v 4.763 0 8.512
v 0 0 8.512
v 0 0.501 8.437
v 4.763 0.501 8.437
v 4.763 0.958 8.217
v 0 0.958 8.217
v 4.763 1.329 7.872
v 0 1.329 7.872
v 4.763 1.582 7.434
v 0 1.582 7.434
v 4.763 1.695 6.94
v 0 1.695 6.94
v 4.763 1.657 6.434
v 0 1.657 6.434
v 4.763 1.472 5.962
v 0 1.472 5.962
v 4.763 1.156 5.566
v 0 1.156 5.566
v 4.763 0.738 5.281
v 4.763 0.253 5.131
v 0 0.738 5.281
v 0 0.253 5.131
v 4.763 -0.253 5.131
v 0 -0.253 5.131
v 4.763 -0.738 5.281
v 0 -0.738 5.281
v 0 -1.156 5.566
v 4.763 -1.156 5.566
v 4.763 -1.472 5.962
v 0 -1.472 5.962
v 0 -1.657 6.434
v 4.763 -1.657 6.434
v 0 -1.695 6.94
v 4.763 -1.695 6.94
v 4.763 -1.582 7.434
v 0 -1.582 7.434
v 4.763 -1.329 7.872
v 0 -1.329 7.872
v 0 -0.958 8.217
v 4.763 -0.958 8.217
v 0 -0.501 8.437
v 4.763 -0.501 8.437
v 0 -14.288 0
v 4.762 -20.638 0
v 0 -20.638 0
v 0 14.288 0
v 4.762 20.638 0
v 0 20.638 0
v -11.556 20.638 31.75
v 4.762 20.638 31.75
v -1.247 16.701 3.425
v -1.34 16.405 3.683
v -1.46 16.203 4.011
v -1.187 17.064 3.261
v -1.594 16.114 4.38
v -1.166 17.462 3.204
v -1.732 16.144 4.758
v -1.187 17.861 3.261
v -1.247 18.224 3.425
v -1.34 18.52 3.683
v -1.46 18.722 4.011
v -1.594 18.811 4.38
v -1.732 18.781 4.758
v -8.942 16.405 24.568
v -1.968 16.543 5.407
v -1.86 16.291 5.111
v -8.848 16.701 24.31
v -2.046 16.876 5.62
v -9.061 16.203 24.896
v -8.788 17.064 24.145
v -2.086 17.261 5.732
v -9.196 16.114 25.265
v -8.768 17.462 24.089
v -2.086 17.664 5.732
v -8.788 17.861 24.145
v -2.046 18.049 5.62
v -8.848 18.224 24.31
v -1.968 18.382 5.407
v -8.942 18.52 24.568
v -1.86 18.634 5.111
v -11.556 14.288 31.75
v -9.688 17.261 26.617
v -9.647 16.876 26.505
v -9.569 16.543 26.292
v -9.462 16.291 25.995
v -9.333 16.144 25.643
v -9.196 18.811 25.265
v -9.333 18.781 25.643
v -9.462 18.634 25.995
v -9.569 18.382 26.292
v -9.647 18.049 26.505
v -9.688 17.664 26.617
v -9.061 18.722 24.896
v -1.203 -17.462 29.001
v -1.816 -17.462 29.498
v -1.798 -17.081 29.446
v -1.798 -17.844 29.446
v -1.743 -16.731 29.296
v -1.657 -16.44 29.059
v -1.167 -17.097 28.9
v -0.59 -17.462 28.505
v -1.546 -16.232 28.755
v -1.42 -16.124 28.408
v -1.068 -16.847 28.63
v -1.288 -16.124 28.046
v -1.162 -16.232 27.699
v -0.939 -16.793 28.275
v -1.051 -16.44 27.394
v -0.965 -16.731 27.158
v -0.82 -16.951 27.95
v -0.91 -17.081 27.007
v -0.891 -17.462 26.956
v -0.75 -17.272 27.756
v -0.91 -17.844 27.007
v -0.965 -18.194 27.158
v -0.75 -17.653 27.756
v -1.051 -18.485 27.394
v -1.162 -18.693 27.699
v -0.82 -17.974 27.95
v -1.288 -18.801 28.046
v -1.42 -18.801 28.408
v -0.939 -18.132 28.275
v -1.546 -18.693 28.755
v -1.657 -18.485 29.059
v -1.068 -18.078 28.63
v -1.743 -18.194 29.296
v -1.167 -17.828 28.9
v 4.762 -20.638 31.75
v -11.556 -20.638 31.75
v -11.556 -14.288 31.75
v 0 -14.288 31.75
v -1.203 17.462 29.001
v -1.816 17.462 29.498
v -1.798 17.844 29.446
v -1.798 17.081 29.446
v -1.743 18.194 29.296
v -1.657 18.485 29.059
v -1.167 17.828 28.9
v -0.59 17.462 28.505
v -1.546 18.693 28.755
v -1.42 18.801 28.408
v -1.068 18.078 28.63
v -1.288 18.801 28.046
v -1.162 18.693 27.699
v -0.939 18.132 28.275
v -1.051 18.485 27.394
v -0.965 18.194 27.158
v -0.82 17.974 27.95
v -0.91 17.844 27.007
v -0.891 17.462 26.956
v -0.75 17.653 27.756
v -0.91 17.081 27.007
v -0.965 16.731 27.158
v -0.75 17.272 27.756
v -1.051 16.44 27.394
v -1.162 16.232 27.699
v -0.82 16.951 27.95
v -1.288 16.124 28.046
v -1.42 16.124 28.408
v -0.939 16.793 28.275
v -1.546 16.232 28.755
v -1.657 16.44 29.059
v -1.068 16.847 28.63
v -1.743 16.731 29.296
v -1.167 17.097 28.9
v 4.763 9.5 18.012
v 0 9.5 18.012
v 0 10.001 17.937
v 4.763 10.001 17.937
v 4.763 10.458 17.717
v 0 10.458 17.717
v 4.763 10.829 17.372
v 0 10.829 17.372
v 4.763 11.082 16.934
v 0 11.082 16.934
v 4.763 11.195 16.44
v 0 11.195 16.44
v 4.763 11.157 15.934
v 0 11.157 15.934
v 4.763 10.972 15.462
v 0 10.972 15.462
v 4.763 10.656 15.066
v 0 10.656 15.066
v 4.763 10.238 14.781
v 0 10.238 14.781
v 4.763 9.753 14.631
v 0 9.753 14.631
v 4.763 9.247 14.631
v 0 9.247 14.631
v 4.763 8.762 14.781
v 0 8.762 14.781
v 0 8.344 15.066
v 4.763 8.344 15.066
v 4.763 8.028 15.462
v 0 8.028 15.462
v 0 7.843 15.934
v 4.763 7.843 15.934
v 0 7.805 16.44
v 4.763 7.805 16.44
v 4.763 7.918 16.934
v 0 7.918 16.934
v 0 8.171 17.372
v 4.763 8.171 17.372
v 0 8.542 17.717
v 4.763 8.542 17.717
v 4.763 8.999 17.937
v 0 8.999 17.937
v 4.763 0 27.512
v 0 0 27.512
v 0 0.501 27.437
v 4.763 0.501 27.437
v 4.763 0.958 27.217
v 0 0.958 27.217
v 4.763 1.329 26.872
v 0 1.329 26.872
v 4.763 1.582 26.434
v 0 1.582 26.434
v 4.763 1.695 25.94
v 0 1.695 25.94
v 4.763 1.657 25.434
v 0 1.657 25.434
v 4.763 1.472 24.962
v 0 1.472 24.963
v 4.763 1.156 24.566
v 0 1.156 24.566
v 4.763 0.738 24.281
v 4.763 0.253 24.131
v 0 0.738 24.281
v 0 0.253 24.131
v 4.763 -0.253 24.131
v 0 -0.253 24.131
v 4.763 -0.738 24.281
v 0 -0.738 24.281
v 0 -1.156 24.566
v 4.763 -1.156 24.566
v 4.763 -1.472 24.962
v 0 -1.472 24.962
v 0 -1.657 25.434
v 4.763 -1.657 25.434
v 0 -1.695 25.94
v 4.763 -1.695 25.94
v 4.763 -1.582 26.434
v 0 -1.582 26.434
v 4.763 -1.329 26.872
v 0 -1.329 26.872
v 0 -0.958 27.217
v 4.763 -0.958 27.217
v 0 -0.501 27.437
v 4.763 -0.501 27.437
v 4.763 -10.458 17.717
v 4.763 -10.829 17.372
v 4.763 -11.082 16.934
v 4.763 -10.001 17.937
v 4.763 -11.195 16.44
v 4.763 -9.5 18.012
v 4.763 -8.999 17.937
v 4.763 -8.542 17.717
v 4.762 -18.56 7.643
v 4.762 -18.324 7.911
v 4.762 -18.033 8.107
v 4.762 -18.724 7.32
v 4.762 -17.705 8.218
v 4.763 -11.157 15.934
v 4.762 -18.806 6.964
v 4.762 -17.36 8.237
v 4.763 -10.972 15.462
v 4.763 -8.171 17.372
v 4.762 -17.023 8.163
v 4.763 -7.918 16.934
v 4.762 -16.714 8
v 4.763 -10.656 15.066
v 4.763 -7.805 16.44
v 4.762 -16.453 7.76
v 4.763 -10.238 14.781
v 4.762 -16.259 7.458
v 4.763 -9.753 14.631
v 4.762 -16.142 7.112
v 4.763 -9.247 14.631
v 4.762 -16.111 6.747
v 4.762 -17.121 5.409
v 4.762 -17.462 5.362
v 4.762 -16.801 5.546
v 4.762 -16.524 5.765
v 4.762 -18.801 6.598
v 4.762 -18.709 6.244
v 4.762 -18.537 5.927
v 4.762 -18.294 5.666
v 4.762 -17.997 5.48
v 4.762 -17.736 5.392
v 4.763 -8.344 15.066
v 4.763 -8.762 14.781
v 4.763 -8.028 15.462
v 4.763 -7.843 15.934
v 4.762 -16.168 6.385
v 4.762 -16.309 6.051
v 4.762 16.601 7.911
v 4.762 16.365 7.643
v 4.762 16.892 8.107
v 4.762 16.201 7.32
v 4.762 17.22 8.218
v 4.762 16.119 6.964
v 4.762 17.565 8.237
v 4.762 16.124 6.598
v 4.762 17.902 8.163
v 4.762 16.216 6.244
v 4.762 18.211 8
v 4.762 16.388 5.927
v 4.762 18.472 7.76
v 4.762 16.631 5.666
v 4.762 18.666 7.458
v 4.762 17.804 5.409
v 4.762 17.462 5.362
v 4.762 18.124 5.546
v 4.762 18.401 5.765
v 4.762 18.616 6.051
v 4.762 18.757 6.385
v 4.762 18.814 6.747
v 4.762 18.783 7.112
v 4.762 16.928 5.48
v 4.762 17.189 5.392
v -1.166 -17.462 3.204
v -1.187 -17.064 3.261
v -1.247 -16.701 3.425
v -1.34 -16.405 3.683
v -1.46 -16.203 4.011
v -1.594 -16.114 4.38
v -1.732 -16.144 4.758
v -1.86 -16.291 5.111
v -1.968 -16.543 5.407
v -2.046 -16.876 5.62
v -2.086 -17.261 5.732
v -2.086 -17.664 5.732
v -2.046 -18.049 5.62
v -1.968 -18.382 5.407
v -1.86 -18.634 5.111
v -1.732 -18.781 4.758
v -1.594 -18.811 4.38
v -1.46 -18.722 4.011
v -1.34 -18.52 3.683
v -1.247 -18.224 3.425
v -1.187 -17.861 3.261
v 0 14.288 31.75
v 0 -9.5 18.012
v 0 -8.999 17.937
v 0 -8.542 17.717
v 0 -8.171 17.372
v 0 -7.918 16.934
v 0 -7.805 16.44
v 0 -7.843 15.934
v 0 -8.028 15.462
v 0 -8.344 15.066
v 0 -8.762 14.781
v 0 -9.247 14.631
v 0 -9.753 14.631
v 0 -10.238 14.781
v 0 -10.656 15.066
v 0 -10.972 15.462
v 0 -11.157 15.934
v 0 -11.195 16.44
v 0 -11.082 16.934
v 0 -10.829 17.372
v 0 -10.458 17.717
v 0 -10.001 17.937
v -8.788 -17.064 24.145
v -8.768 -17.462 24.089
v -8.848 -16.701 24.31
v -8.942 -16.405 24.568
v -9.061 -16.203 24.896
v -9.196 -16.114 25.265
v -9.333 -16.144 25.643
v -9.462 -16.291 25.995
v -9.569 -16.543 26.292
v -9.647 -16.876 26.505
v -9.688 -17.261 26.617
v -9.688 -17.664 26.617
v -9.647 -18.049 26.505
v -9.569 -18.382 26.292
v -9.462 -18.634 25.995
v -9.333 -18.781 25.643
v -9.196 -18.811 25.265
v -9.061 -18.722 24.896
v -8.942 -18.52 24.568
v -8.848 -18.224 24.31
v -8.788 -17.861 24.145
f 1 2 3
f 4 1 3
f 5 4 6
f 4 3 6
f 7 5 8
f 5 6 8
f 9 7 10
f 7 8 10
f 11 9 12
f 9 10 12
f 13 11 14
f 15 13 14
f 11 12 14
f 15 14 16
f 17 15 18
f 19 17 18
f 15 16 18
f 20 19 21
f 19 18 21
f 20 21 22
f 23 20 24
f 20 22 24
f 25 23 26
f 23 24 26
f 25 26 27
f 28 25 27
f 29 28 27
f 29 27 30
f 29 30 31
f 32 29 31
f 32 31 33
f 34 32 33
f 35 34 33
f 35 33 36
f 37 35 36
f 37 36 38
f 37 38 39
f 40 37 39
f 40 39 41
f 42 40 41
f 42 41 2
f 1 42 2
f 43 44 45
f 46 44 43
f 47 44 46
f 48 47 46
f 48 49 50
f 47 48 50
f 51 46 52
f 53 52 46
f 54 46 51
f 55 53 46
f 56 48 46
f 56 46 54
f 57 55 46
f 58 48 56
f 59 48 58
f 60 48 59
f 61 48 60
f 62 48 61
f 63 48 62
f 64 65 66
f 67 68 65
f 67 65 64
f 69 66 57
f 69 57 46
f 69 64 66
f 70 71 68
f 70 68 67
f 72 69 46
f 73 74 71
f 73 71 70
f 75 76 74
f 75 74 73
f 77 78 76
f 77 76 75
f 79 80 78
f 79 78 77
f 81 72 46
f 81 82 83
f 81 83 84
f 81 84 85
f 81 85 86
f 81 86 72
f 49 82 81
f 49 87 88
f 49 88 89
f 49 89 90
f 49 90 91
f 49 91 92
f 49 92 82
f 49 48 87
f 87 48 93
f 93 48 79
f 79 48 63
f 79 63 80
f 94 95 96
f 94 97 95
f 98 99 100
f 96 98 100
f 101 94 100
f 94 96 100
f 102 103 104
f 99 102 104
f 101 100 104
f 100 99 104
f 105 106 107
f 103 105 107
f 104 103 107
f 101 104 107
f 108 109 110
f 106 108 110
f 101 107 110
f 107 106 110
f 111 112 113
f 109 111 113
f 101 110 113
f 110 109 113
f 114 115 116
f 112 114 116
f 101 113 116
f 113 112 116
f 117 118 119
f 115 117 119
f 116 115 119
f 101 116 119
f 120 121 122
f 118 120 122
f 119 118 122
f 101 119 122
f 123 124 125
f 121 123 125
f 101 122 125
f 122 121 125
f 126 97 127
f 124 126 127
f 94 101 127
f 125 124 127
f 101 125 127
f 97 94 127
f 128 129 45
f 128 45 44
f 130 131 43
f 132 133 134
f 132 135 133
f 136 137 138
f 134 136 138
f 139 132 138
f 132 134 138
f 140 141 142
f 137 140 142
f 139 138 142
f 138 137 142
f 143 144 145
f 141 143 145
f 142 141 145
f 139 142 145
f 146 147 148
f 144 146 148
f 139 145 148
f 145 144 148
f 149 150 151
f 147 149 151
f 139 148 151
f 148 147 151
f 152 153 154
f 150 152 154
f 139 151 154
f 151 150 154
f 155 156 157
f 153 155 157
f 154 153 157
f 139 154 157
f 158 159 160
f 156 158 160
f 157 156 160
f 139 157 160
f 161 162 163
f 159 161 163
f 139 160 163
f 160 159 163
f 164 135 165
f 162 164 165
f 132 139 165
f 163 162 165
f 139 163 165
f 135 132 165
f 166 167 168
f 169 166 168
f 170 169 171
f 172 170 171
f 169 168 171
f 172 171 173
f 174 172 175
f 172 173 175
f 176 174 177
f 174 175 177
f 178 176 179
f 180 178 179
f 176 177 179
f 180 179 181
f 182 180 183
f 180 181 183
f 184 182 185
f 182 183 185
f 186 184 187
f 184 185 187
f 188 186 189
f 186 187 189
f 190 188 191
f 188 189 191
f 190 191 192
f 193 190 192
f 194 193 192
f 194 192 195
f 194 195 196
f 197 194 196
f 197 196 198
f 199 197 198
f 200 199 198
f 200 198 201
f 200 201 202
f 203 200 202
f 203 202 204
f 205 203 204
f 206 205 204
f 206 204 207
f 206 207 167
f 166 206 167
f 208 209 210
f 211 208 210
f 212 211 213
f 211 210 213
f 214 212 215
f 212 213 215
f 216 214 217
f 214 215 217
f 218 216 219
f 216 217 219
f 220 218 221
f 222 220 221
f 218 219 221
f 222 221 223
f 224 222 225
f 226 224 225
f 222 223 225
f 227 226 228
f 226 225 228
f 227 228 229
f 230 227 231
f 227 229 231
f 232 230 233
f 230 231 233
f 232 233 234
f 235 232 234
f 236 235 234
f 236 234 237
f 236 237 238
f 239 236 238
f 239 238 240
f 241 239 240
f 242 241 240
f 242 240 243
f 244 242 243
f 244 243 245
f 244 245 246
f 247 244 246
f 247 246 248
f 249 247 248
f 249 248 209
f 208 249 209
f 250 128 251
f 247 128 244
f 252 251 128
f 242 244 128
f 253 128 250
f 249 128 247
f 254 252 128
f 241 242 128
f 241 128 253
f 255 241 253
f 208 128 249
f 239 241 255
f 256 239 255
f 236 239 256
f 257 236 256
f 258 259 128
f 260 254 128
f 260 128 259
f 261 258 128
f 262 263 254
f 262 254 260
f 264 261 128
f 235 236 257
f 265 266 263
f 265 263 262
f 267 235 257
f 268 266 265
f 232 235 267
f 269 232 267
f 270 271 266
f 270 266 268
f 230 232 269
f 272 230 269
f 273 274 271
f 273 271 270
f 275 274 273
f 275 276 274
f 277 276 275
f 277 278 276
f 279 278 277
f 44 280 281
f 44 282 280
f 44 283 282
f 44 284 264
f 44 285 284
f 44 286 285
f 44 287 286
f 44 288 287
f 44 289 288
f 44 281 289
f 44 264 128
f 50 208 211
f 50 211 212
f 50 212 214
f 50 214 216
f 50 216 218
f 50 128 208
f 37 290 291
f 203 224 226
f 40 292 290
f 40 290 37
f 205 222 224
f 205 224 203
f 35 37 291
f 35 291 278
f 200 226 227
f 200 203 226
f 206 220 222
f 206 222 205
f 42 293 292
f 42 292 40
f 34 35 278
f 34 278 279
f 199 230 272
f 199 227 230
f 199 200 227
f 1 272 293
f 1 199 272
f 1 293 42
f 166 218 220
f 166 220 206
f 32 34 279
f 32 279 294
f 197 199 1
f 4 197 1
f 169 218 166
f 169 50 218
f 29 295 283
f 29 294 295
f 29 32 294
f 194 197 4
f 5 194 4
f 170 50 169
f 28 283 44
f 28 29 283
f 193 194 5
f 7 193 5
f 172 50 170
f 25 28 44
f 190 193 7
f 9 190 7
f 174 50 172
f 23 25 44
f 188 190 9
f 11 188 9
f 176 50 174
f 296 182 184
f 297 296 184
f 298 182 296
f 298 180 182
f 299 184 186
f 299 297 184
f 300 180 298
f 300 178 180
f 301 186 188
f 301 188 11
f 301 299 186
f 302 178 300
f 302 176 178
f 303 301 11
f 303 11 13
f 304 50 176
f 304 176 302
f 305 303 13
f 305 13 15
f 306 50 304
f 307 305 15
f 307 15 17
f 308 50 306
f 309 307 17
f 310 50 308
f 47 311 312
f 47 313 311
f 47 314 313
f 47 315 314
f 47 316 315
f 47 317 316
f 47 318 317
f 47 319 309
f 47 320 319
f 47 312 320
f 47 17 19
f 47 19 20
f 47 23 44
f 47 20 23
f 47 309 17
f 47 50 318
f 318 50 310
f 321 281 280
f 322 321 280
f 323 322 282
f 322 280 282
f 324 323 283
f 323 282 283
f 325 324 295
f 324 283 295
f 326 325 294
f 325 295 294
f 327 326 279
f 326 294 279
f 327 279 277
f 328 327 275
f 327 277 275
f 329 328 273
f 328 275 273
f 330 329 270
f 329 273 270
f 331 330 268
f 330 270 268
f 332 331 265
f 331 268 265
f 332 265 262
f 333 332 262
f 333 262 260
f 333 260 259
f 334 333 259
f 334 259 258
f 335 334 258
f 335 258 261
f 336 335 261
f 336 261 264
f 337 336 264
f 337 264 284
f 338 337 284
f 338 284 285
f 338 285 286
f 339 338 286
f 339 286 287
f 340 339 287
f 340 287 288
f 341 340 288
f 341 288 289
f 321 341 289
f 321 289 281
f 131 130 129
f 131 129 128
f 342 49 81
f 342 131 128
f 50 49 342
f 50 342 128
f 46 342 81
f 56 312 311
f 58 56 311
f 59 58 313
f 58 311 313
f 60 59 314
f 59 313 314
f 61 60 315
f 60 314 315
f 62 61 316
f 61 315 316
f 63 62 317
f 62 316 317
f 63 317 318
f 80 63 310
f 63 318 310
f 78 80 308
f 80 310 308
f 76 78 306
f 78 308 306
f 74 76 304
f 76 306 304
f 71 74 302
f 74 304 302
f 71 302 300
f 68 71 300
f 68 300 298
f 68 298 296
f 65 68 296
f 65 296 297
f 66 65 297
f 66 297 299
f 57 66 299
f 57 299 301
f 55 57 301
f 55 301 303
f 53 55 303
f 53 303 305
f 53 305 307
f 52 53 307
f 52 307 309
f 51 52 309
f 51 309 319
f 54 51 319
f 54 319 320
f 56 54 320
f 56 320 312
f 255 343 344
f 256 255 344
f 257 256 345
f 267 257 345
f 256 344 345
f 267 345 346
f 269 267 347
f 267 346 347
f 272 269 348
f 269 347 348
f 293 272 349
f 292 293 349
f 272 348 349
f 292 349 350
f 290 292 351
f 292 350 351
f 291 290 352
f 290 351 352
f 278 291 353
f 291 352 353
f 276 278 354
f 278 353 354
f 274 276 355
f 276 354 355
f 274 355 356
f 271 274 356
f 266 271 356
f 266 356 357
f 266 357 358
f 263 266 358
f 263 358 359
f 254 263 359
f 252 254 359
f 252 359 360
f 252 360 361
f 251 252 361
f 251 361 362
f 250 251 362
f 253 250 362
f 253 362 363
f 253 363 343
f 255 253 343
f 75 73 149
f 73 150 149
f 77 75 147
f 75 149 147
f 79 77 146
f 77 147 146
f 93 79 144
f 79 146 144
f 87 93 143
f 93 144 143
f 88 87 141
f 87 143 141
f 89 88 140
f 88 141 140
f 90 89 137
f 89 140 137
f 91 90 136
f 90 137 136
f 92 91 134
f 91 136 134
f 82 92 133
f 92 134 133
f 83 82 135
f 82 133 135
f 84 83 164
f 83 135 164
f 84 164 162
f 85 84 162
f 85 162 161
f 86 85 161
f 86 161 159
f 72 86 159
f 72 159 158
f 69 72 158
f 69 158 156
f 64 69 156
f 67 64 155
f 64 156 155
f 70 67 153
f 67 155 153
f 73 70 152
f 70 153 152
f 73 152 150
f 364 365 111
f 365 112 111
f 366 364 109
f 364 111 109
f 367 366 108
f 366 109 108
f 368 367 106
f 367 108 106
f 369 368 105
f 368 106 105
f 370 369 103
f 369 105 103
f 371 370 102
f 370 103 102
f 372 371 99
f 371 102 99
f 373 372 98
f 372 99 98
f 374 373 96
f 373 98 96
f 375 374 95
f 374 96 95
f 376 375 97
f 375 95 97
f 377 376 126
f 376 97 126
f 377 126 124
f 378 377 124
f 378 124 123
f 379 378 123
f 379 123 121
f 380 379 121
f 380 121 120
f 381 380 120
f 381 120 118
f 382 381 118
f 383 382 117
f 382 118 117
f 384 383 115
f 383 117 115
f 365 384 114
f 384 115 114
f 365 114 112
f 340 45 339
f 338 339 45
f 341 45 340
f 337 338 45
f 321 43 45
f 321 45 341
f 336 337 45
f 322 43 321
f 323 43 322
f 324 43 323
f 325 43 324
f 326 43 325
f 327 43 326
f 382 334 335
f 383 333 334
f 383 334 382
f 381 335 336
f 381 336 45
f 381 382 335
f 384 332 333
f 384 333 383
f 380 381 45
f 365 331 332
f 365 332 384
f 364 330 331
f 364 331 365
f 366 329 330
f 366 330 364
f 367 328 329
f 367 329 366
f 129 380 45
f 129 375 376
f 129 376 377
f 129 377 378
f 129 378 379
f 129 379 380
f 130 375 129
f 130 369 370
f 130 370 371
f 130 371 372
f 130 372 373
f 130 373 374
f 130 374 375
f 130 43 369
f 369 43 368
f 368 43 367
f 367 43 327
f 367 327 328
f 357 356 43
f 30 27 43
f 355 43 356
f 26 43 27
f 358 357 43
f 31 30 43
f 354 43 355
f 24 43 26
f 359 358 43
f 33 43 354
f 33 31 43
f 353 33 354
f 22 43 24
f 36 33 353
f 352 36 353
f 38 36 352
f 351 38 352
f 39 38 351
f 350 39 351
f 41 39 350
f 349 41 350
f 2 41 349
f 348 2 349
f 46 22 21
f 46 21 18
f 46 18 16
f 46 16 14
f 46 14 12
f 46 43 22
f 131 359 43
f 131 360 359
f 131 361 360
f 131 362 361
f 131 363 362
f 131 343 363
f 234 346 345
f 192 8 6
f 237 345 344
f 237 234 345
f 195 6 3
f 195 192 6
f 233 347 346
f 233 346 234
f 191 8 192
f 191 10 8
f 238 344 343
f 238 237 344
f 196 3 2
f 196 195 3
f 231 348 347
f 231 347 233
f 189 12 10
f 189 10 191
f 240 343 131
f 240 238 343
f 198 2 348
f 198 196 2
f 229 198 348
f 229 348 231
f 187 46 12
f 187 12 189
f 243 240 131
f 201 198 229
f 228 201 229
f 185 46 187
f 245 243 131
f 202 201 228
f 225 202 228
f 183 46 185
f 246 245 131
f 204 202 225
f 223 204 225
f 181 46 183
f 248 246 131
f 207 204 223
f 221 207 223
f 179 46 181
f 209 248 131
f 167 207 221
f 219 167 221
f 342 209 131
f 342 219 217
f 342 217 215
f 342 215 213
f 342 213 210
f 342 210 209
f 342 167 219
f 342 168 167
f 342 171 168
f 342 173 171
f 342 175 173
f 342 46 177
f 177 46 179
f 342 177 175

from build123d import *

# Parameters (mm, degrees)
BOSS_EXTRUDE1_DEPTH       = 20.6375
M3_CLEARANCE_HOLE1_D      = 3.4
CUT_EXTRUDE1_DEPTH        = 14.2875
CUT_EXTRUDE1_DEPTH_BACK   = 14.2875
F_6_32_TAPPED_HOLE1_D     = 2.7051
F_6_32_TAPPED_HOLE1_DEPTH = 8.382
F_6_32_TAPPED_HOLE1_TIP   = 0.81269403


with BuildPart() as part:
    # Sketch1 → Boss-Extrude1 (new body, symmetric)
    with BuildSketch(Plane(origin=(0, 0, 0), x_dir=(1, 0, 0), z_dir=(0, 1, 0))):
        Polygon((0, 0), (-11.556054938, -31.75), (4.7625, -31.75), (4.7625, 0), align=None)
    extrude(amount=BOSS_EXTRUDE1_DEPTH, both=True)

    # M3 Clearance Hole1 (through all)
    with Locations(Plane(origin=(4.7625, 0, 0), x_dir=(0, 0, -1), z_dir=(1, 0, 0))):
        with Locations((-16.3125, 9.5), (-6.8125, 0), (-16.3125, -9.5), (-25.8125, 0)):
            Hole(M3_CLEARANCE_HOLE1_D / 2)

    # Sketch15 → Cut-Extrude1 (cut, two sides)
    with BuildSketch(Plane(origin=(0, 0, 0), x_dir=(1, 0, 0), z_dir=(0, 1, 0))) as cut_extrude1_sk:
        Polygon((-11.556054938, -31.75), (0, 0), (0, -31.75), align=None)
    extrude(amount=CUT_EXTRUDE1_DEPTH, mode=Mode.SUBTRACT)
    extrude(cut_extrude1_sk.sketch, amount=-CUT_EXTRUDE1_DEPTH_BACK, mode=Mode.SUBTRACT)

    # #6-32 Tapped Hole1
    with Locations(Plane(origin=(0, 0, 0), x_dir=(-0.342020143, 0, 0.939692621), z_dir=(-0.939692621, 0, -0.342020143))):
        with Locations((4.7625, 17.4625), (26.9875, 17.4625), (26.9875, -17.4625), (4.7625, -17.4625)):
            Hole(F_6_32_TAPPED_HOLE1_D / 2, depth=F_6_32_TAPPED_HOLE1_DEPTH)
            with Locations((0, 0, -(F_6_32_TAPPED_HOLE1_DEPTH + F_6_32_TAPPED_HOLE1_TIP / 2))):  # 118° drill point
                Cone(0, F_6_32_TAPPED_HOLE1_D / 2, F_6_32_TAPPED_HOLE1_TIP, mode=Mode.SUBTRACT)


solid = part.part
